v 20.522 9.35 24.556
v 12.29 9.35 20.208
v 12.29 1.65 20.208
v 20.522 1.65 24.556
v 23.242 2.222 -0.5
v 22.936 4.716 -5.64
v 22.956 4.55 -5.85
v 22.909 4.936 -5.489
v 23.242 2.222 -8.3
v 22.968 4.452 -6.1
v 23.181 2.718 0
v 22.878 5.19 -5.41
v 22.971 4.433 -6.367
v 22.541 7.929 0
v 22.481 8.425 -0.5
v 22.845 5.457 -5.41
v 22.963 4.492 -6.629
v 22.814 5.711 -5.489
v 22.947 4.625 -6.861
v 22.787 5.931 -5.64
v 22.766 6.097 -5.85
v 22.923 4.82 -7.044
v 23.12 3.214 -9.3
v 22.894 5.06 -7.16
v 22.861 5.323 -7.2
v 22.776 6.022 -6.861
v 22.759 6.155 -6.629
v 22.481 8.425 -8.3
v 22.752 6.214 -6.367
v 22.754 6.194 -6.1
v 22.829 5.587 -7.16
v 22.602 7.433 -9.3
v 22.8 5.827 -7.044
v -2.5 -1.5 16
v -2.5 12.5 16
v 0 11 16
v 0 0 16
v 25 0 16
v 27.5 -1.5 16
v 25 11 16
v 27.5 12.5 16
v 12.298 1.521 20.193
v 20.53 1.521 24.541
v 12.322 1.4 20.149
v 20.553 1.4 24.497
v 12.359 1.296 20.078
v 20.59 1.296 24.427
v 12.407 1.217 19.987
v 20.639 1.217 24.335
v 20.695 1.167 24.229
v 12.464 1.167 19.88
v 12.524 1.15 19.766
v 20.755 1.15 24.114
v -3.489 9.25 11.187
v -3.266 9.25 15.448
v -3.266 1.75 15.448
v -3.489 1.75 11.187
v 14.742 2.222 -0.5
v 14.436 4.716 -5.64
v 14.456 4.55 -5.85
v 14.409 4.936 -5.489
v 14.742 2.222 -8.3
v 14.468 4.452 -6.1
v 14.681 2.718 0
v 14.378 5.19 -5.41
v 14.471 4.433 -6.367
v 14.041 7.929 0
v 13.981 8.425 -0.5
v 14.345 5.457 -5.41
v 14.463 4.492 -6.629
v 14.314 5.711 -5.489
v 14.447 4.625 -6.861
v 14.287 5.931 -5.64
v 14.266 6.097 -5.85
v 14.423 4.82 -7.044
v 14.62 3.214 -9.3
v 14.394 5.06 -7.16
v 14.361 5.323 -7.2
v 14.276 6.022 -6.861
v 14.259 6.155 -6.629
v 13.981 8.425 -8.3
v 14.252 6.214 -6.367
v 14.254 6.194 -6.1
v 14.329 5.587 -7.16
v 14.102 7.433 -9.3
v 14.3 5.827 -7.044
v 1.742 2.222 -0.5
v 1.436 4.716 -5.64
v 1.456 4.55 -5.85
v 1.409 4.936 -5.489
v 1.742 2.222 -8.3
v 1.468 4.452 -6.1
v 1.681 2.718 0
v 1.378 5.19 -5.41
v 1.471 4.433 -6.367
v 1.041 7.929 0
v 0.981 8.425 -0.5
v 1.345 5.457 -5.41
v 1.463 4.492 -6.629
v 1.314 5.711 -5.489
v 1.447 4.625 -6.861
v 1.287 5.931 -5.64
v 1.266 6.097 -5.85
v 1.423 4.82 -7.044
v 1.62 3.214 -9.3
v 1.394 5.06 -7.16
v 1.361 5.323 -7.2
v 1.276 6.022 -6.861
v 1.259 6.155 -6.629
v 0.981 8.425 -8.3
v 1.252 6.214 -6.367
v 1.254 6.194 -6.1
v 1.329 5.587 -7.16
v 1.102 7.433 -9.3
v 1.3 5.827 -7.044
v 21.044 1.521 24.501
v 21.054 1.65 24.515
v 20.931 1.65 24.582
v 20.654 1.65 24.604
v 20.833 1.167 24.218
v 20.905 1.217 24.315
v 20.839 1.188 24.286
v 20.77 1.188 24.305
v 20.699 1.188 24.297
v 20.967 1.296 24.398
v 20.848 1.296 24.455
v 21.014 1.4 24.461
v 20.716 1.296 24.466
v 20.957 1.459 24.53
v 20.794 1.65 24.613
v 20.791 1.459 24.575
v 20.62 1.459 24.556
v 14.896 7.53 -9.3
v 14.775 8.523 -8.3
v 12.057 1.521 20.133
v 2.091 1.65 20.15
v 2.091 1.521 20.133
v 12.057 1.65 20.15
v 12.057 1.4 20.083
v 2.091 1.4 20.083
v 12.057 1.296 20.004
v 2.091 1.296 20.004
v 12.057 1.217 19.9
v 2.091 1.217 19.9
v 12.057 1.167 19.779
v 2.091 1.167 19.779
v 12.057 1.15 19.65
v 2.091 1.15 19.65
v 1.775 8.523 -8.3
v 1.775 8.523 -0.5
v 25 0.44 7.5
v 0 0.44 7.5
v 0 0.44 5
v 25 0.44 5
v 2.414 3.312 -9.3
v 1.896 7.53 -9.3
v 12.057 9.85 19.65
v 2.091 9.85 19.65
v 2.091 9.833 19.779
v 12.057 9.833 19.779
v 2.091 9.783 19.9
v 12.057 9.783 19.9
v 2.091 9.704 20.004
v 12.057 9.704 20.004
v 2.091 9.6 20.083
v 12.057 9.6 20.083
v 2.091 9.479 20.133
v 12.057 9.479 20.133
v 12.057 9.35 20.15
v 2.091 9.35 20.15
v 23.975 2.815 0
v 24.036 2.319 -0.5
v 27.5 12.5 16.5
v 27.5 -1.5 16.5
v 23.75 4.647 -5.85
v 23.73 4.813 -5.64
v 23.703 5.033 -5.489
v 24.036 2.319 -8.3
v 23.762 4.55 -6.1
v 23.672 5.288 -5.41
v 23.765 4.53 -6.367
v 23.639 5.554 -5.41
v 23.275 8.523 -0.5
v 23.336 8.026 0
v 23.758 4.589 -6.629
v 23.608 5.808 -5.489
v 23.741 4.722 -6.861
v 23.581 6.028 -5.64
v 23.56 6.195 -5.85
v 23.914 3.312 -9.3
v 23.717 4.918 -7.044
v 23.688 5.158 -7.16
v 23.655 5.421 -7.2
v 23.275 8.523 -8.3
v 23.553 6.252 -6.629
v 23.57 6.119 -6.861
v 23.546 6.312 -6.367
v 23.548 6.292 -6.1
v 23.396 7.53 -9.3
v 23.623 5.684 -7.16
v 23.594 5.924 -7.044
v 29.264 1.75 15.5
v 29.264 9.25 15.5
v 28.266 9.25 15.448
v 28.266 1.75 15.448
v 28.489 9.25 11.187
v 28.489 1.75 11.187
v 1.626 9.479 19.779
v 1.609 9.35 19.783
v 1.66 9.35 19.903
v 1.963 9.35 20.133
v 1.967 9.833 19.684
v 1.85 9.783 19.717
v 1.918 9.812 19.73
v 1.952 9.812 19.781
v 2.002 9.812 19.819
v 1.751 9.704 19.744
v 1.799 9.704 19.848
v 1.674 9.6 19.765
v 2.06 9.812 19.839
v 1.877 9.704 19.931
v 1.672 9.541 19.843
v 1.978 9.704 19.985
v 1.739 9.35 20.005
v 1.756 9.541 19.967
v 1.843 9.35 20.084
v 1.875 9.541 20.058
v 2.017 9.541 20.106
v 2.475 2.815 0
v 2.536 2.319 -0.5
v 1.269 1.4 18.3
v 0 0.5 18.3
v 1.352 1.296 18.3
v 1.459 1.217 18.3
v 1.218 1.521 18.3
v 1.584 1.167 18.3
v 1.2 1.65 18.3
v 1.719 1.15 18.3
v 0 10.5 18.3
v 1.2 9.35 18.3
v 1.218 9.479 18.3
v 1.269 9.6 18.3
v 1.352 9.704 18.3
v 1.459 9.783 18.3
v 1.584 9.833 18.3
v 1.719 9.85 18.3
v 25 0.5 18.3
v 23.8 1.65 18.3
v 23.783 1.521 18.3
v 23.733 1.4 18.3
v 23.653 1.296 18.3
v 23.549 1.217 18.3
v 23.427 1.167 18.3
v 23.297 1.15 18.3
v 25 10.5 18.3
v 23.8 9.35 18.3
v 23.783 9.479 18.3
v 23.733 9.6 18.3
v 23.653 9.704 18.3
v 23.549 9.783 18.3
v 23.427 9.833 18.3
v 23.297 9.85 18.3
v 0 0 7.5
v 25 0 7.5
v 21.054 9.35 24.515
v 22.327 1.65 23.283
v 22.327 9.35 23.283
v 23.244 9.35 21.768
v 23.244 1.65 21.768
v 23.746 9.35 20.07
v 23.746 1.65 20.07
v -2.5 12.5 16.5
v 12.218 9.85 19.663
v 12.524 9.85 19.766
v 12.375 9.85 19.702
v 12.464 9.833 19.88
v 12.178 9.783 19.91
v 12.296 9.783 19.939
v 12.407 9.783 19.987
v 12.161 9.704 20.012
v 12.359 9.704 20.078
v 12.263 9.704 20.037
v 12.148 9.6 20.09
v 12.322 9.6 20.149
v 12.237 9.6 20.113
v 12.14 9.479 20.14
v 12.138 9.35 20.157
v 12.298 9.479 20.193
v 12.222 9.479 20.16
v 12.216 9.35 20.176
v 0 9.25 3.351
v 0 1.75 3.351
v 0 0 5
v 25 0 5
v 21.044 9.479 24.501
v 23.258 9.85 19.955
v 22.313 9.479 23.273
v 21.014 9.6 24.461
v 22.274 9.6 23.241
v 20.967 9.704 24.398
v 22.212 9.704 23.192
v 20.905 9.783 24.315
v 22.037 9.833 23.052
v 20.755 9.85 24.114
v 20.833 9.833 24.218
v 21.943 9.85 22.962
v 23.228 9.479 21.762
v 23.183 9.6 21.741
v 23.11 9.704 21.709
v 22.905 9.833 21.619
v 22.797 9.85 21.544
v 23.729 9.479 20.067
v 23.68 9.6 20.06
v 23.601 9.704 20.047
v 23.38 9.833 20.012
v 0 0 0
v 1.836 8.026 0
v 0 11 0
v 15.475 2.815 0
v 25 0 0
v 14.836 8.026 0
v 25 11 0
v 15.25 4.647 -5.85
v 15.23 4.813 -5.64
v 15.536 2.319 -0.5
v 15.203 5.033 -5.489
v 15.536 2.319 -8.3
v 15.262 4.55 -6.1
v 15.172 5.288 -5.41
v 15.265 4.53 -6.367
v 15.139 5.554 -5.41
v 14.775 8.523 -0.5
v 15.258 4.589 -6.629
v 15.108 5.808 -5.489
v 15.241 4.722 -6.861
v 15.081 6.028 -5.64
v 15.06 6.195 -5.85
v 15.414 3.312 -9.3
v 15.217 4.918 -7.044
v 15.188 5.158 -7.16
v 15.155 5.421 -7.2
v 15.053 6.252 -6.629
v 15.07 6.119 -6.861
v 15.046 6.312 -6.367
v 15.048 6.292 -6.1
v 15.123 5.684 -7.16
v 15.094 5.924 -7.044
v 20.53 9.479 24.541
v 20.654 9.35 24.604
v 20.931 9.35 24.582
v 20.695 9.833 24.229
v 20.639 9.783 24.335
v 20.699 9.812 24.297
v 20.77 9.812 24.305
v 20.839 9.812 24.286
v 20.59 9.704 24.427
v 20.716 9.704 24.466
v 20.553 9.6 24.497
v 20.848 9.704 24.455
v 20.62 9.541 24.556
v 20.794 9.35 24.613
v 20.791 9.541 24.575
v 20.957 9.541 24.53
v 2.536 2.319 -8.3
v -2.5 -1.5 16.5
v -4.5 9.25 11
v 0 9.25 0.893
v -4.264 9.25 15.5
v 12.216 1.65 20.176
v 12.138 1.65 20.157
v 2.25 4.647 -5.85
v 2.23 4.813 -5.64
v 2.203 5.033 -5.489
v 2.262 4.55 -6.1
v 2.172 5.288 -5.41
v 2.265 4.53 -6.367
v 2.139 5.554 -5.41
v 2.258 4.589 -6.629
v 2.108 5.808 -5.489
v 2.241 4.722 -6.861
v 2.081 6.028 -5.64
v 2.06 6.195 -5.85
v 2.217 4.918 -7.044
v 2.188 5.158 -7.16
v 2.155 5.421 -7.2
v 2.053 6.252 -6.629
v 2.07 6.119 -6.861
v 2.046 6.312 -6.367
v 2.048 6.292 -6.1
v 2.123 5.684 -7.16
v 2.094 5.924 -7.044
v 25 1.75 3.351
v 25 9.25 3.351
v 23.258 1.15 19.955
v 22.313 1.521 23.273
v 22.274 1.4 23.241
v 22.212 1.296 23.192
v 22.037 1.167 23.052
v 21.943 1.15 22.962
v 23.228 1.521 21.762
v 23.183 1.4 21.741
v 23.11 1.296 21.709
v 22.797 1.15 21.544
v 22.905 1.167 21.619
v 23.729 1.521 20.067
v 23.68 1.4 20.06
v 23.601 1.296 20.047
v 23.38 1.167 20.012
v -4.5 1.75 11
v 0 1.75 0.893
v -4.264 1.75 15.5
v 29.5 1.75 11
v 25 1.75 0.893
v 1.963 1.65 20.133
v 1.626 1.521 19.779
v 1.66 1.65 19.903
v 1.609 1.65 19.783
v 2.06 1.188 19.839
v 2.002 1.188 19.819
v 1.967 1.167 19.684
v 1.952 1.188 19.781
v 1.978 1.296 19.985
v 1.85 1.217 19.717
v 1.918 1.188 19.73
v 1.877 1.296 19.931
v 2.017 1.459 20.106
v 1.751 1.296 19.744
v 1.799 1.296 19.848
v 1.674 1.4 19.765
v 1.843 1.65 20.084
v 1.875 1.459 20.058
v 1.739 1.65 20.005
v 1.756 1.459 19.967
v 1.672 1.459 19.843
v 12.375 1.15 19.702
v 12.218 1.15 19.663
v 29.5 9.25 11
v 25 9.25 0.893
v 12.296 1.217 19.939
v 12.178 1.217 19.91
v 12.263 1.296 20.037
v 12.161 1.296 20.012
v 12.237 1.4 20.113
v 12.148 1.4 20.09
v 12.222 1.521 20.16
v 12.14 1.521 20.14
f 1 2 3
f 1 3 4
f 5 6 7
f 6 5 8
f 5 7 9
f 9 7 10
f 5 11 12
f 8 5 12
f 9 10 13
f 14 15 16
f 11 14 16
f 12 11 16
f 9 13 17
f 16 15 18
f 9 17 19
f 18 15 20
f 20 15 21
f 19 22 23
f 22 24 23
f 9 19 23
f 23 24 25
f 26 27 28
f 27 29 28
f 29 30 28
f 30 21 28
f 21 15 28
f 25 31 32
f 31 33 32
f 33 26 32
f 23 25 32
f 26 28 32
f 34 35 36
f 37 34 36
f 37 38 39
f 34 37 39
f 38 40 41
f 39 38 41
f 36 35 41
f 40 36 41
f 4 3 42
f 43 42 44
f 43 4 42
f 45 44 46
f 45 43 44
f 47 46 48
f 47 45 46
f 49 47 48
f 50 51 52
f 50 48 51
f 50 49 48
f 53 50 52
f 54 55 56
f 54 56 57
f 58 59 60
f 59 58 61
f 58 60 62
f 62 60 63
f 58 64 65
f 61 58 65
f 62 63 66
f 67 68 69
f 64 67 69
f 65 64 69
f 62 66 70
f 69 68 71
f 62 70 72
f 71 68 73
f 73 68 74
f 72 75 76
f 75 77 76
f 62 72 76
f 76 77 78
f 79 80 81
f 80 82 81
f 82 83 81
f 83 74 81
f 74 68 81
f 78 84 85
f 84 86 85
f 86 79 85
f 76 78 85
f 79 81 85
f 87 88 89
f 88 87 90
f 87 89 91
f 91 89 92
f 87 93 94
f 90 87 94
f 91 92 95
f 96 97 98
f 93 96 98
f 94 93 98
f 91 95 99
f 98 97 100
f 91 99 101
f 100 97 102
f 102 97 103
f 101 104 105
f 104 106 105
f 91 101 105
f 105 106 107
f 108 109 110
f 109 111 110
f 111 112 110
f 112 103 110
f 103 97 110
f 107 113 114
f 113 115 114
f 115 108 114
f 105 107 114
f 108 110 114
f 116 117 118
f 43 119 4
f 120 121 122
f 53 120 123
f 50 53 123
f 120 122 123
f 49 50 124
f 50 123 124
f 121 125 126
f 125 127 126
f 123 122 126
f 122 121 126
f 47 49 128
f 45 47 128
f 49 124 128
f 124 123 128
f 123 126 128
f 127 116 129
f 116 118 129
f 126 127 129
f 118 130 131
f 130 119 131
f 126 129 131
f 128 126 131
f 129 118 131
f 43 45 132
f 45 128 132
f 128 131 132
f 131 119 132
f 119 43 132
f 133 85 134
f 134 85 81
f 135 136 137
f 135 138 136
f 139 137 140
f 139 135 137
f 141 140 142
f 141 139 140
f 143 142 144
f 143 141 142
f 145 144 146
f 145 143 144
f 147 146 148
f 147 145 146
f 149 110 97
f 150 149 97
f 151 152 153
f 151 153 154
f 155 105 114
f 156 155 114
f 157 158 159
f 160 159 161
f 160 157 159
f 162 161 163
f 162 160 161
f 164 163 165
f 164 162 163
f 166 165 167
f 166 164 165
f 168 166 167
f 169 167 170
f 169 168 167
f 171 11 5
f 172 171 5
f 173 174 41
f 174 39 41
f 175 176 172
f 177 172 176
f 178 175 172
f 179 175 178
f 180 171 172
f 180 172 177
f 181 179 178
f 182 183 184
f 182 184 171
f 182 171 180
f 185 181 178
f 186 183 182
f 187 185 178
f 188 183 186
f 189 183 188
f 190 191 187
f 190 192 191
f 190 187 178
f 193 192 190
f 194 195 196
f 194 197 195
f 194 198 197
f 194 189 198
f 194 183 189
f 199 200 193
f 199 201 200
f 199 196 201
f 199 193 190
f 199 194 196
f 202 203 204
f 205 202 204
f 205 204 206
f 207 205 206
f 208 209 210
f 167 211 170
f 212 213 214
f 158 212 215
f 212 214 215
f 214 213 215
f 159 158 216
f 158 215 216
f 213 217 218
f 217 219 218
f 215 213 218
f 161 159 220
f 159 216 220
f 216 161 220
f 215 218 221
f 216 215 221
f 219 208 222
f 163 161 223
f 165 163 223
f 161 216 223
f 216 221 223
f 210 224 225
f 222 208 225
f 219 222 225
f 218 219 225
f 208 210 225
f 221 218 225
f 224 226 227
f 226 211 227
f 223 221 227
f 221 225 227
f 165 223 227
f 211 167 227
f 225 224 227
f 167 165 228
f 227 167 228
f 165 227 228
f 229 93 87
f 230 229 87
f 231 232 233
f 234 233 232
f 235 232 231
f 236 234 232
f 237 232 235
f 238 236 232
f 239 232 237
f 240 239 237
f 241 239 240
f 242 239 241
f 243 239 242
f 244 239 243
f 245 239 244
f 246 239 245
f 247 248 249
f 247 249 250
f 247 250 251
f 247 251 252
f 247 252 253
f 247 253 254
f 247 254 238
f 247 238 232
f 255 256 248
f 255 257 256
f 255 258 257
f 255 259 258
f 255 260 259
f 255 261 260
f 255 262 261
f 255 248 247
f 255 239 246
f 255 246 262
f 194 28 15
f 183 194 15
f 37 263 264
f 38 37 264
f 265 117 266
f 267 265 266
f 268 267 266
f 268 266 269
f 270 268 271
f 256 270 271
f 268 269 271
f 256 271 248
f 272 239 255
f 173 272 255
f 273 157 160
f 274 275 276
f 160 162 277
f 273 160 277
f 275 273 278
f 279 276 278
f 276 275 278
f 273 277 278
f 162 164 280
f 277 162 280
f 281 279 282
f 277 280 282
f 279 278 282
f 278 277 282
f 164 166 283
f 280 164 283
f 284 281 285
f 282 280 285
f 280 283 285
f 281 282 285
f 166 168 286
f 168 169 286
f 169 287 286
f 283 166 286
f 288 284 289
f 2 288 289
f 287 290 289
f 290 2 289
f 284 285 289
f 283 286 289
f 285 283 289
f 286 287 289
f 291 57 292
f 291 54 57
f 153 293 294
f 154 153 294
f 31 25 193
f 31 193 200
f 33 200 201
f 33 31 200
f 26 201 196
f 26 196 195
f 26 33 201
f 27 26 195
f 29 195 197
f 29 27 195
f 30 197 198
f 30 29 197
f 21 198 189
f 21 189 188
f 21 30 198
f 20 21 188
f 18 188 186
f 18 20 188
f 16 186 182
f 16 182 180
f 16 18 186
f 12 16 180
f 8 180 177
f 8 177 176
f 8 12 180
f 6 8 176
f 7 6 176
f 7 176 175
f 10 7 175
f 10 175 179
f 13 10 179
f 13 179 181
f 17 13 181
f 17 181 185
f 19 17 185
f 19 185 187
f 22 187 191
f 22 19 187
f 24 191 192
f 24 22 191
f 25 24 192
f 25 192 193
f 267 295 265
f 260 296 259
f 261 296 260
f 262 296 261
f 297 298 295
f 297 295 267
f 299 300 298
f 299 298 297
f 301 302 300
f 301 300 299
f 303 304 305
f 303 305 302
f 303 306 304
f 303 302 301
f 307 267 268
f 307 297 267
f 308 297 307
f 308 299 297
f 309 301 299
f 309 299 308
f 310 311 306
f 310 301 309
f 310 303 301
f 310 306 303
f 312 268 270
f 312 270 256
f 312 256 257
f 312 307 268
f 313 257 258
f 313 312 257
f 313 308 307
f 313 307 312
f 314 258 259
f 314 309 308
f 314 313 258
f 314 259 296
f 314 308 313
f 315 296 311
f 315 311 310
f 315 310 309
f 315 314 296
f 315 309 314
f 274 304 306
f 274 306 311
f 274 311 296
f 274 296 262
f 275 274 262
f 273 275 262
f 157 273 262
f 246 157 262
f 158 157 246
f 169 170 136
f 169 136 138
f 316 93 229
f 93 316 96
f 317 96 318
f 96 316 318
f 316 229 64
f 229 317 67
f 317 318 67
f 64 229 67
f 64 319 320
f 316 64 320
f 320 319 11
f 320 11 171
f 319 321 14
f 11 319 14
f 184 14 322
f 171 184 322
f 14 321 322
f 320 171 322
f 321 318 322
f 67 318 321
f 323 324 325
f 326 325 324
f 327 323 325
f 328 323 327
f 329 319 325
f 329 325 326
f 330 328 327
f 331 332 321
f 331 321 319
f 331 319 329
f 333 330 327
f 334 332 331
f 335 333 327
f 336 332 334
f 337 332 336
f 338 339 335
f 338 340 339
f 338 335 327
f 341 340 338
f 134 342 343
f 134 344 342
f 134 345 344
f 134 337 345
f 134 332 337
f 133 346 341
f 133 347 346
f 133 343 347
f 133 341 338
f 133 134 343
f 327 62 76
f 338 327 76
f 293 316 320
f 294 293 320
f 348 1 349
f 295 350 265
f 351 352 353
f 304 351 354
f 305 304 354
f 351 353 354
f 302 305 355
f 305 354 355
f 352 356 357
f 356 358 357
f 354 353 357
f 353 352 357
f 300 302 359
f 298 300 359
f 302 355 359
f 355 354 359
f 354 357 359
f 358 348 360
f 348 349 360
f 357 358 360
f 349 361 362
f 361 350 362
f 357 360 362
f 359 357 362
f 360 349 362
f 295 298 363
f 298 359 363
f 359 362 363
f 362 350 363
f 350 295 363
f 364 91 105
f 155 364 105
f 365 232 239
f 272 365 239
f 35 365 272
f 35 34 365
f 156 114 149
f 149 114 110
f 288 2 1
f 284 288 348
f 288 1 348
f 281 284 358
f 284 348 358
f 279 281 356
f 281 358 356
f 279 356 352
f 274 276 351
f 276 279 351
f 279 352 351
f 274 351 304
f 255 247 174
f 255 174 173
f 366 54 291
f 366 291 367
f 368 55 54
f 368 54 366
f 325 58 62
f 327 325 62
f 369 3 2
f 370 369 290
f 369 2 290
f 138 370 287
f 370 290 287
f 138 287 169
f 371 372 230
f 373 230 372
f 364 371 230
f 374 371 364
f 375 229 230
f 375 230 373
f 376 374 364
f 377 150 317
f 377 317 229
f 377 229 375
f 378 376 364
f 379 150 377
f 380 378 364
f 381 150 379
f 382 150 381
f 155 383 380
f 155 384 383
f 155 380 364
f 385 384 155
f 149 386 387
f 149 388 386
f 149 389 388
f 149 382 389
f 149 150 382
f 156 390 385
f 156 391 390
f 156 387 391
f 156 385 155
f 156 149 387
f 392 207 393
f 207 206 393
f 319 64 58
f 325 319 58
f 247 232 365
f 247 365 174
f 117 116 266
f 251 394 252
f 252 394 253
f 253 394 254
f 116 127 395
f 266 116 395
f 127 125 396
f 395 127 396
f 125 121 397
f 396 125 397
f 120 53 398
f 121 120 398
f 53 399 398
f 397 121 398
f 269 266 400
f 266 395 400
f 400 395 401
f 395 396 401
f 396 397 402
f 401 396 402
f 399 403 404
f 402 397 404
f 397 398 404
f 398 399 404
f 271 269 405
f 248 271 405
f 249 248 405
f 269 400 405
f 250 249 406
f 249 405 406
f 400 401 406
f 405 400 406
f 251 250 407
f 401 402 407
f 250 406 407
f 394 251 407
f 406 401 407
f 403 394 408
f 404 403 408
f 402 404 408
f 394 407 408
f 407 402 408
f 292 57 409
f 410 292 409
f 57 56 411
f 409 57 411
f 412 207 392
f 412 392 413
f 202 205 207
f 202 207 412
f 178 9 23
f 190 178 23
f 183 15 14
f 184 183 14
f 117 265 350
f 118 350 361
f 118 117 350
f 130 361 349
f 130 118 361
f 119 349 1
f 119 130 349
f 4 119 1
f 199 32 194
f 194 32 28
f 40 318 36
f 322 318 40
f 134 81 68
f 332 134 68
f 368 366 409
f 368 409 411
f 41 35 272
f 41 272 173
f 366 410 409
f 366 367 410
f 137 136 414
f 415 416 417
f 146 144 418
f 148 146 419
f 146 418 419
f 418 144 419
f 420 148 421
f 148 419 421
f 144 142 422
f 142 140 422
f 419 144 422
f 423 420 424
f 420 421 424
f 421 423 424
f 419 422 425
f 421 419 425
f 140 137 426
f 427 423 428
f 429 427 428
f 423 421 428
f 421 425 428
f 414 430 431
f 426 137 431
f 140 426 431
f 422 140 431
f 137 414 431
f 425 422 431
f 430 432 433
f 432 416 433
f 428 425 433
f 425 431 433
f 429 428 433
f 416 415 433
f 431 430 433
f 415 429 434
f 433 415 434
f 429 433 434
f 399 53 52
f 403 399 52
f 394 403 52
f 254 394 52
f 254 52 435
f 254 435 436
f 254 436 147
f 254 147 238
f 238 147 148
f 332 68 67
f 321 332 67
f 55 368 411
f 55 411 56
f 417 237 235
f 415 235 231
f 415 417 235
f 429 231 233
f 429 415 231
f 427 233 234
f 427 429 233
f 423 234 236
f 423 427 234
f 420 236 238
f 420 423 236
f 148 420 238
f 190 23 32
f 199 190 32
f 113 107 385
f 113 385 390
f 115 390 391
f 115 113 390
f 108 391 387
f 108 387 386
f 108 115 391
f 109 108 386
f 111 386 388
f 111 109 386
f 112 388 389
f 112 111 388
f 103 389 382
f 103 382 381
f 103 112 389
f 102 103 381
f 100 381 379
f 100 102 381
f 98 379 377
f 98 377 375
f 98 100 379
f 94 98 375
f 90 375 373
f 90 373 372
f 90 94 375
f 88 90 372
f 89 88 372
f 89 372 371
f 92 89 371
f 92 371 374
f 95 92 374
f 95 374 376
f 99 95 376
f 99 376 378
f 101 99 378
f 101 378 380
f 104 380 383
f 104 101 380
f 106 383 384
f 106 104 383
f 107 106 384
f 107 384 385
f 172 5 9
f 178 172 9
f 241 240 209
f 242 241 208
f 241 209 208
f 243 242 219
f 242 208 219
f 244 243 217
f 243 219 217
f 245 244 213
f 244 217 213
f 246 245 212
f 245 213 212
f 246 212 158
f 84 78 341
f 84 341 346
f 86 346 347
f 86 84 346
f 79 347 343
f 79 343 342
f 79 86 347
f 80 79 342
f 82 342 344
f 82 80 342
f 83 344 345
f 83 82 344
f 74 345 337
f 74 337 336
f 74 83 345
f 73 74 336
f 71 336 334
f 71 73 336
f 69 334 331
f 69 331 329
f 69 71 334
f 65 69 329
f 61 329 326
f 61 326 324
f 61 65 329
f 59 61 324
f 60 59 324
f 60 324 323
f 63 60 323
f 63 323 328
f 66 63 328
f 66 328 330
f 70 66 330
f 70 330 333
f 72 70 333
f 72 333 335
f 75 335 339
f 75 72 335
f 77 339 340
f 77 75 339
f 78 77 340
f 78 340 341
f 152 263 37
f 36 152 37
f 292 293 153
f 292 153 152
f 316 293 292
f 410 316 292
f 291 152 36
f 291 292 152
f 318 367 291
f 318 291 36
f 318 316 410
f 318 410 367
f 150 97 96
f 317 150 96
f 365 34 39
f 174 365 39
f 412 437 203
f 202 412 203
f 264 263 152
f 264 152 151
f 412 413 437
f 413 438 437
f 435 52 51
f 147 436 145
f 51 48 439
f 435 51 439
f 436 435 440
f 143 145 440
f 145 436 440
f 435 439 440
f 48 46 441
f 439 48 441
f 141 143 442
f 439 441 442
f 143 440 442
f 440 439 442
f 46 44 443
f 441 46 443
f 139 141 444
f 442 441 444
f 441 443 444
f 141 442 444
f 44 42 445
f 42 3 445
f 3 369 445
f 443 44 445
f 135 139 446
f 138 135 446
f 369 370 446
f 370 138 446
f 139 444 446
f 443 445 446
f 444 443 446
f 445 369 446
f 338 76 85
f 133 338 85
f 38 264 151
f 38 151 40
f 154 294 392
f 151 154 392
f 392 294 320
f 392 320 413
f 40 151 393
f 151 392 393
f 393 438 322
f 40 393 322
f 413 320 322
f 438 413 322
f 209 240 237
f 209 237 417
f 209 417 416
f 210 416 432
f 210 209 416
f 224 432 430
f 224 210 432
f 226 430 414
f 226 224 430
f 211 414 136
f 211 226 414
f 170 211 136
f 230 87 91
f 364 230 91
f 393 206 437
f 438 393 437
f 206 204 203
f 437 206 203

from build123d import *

# Parameters (mm, degrees)
SKETCH1_W             = 25
SKETCH1_H             = 11
EXTRUDE1_DEPTH        = 16
SKETCH2_W             = 30
SKETCH2_H             = 14
EXTRUDE2_DEPTH        = 2.3
CHAMFER1_SIZE         = 1.8
CHAMFER1_SIZE2        = 2
CHAMFER1_PART_2_SIZE  = 1.8
CHAMFER1_PART_2_SIZE2 = 2
CHAMFER2_SIZE         = 1.8
CHAMFER2_SIZE2        = 2.5
CHAMFER2_PART_2_SIZE  = 1.8
CHAMFER2_PART_2_SIZE2 = 2.5
EXTRUDE3_DEPTH        = 3.75
EXTRUDE4_DEPTH        = 4.35
EXTRUDE4_DEPTH_BACK   = 4.35
FILLET1_R             = 0.5
SKETCH7_W             = 25
SKETCH7_H             = 2.5
CUT_EXTRUDE2_DEPTH    = 0.44
SKETCH8_R             = 0.9
EXTRUDE5_DEPTH        = 0.8
LPATTERN1_COUNT       = 2
LPATTERN1_PITCH       = 13
LPATTERN2_COUNT       = 2
LPATTERN2_PITCH       = 21.5


with BuildPart() as part:
    # Sketch1 → Extrude1 (new body)
    with BuildSketch(Plane.XY):
        with Locations((12.5, 5.5)):
            Rectangle(SKETCH1_W, SKETCH1_H)
    extrude(amount=EXTRUDE1_DEPTH)

    # Sketch2 → Extrude2 (add)
    with BuildSketch(Plane.XY.offset(16)):
        with Locations((12.5, 5.5)):
            Rectangle(SKETCH2_W, SKETCH2_H)
    extrude(amount=EXTRUDE2_DEPTH)

    # Chamfer1
    chamfer1_edges = [part.edges().sort_by_distance(p)[0] for p in [
        (12.5, -1.5, 18.3),
    ]]
    chamfer1_side = [part.faces().sort_by_distance(p)[0] for p in [
        (12.5, -1.5, 17.15),
    ]]
    chamfer(chamfer1_edges, length=CHAMFER1_SIZE, length2=CHAMFER1_SIZE2, reference=chamfer1_side[0])

    # Chamfer1 part 2
    chamfer1_part_2_edges = [part.edges().sort_by_distance(p)[0] for p in [
        (12.5, 12.5, 18.3),
    ]]
    chamfer1_part_2_side = [part.faces().sort_by_distance(p)[0] for p in [
        (12.5, 12.5, 17.15),
    ]]
    chamfer(chamfer1_part_2_edges, length=CHAMFER1_PART_2_SIZE, length2=CHAMFER1_PART_2_SIZE2, reference=chamfer1_part_2_side[0])

    # Chamfer2
    chamfer2_edges = [part.edges().sort_by_distance(p)[0] for p in [
        (27.5, 5.5, 18.3),
    ]]
    chamfer2_side = [part.faces().sort_by_distance(p)[0] for p in [
        (27.5, 5.5, 17.080769231),
    ]]
    chamfer(chamfer2_edges, length=CHAMFER2_SIZE, length2=CHAMFER2_SIZE2, reference=chamfer2_side[0])

    # Chamfer2 part 2
    chamfer2_part_2_edges = [part.edges().sort_by_distance(p)[0] for p in [
        (-2.5, 5.5, 18.3),
    ]]
    chamfer2_part_2_side = [part.faces().sort_by_distance(p)[0] for p in [
        (-2.5, 5.5, 17.080769231),
    ]]
    chamfer(chamfer2_part_2_edges, length=CHAMFER2_PART_2_SIZE, length2=CHAMFER2_PART_2_SIZE2, reference=chamfer2_part_2_side[0])

    # Sketch4 → Extrude3 (add, symmetric)
    with BuildSketch(Plane(origin=(0, 5.5, 0), x_dir=(-1, 0, 0), z_dir=(0, 1, 0))):
        Polygon((0, 0.892834517), (4.5, 11), (4.264164993, 15.5), (3.265535458, 15.447664044), (3.488805714, 11.187413783), (0, 3.351427853), align=None)
    extrude3 = extrude(amount=EXTRUDE3_DEPTH, both=True)

    # Mirror1: Extrude3 across plane
    add(extrude3.mirror(Plane(origin=(12.5, 0, 0), x_dir=(0, 0, 1), z_dir=(1, 0, 0))))

    # Sketch6 → Extrude4 (add, two sides)
    with BuildSketch(Plane(origin=(0, 5.5, 0), x_dir=(-1, 0, 0), z_dir=(0, 1, 0))) as extrude4_sk:
        with BuildLine():
            Line((-1.2, 18.3), (-1.710738672, 20.15))
            Line((-1.710738672, 20.15), (-12.18088144, 20.15))
            Line((-12.18088144, 20.15), (-20.793792675, 24.7))
            ThreePointArc((-20.793792675, 24.7), (-23.177832074, 21.913793041), (-23.8, 18.3))
            Line((-23.8, 18.3), (-1.2, 18.3))
        make_face()
    extrude(amount=EXTRUDE4_DEPTH)
    extrude(extrude4_sk.sketch, amount=-EXTRUDE4_DEPTH_BACK)

    # Fillet1
    fillet1_edges = [part.edges().sort_by_distance(p)[0] for p in [
        (1.455369336, 1.15, 19.225),
        (1.710738672, 5.5, 20.15),
        (6.945810056, 1.15, 20.15),
        (12.18088144, 5.5, 20.15),
        (16.487337058, 1.15, 22.425),
        (20.793792675, 5.5, 24.7),
        (23.177832074, 1.15, 21.913793041),
        (1.455369336, 9.85, 19.225),
        (6.945810056, 9.85, 20.15),
        (16.487337058, 9.85, 22.425),
        (23.177832074, 9.85, 21.913793041),
    ]]
    fillet(fillet1_edges, radius=FILLET1_R)

    # Sketch7 → Cut-Extrude2 (cut)
    with BuildSketch(Plane.XZ):
        with Locations((12.5, 6.25)):
            Rectangle(SKETCH7_W, SKETCH7_H)
    extrude(amount=-CUT_EXTRUDE2_DEPTH, mode=Mode.SUBTRACT)

    # Sketch8 → Extrude5 (add)
    with BuildSketch(Plane(origin=(1.985092303, 0.243738687, 0), x_dir=(0, 0, -1), z_dir=(0.992546152, 0.121869343, 0))):
        Polygon((8.3, 1.992800038), (9.3, 2.992800038), (9.3, 7.242800038), (8.3, 8.242800038), (0.5, 8.242800038), (0, 7.742800038), (0, 2.492800038), (0.5, 1.992800038), align=None)
        with Locations((6.3, 5.117800038)):
            Circle(SKETCH8_R, mode=Mode.SUBTRACT)
    extrude5 = extrude(amount=EXTRUDE5_DEPTH)

    # LPattern1: Extrude5 ×2
    with Locations(*[(i * LPATTERN1_PITCH, 0, 0) for i in range(1, LPATTERN1_COUNT)]):
        add(extrude5)

    # LPattern2: Extrude5 ×2
    with Locations(*[(i * LPATTERN2_PITCH, 0, 0) for i in range(1, LPATTERN2_COUNT)]):
        add(extrude5)


solid = part.part
